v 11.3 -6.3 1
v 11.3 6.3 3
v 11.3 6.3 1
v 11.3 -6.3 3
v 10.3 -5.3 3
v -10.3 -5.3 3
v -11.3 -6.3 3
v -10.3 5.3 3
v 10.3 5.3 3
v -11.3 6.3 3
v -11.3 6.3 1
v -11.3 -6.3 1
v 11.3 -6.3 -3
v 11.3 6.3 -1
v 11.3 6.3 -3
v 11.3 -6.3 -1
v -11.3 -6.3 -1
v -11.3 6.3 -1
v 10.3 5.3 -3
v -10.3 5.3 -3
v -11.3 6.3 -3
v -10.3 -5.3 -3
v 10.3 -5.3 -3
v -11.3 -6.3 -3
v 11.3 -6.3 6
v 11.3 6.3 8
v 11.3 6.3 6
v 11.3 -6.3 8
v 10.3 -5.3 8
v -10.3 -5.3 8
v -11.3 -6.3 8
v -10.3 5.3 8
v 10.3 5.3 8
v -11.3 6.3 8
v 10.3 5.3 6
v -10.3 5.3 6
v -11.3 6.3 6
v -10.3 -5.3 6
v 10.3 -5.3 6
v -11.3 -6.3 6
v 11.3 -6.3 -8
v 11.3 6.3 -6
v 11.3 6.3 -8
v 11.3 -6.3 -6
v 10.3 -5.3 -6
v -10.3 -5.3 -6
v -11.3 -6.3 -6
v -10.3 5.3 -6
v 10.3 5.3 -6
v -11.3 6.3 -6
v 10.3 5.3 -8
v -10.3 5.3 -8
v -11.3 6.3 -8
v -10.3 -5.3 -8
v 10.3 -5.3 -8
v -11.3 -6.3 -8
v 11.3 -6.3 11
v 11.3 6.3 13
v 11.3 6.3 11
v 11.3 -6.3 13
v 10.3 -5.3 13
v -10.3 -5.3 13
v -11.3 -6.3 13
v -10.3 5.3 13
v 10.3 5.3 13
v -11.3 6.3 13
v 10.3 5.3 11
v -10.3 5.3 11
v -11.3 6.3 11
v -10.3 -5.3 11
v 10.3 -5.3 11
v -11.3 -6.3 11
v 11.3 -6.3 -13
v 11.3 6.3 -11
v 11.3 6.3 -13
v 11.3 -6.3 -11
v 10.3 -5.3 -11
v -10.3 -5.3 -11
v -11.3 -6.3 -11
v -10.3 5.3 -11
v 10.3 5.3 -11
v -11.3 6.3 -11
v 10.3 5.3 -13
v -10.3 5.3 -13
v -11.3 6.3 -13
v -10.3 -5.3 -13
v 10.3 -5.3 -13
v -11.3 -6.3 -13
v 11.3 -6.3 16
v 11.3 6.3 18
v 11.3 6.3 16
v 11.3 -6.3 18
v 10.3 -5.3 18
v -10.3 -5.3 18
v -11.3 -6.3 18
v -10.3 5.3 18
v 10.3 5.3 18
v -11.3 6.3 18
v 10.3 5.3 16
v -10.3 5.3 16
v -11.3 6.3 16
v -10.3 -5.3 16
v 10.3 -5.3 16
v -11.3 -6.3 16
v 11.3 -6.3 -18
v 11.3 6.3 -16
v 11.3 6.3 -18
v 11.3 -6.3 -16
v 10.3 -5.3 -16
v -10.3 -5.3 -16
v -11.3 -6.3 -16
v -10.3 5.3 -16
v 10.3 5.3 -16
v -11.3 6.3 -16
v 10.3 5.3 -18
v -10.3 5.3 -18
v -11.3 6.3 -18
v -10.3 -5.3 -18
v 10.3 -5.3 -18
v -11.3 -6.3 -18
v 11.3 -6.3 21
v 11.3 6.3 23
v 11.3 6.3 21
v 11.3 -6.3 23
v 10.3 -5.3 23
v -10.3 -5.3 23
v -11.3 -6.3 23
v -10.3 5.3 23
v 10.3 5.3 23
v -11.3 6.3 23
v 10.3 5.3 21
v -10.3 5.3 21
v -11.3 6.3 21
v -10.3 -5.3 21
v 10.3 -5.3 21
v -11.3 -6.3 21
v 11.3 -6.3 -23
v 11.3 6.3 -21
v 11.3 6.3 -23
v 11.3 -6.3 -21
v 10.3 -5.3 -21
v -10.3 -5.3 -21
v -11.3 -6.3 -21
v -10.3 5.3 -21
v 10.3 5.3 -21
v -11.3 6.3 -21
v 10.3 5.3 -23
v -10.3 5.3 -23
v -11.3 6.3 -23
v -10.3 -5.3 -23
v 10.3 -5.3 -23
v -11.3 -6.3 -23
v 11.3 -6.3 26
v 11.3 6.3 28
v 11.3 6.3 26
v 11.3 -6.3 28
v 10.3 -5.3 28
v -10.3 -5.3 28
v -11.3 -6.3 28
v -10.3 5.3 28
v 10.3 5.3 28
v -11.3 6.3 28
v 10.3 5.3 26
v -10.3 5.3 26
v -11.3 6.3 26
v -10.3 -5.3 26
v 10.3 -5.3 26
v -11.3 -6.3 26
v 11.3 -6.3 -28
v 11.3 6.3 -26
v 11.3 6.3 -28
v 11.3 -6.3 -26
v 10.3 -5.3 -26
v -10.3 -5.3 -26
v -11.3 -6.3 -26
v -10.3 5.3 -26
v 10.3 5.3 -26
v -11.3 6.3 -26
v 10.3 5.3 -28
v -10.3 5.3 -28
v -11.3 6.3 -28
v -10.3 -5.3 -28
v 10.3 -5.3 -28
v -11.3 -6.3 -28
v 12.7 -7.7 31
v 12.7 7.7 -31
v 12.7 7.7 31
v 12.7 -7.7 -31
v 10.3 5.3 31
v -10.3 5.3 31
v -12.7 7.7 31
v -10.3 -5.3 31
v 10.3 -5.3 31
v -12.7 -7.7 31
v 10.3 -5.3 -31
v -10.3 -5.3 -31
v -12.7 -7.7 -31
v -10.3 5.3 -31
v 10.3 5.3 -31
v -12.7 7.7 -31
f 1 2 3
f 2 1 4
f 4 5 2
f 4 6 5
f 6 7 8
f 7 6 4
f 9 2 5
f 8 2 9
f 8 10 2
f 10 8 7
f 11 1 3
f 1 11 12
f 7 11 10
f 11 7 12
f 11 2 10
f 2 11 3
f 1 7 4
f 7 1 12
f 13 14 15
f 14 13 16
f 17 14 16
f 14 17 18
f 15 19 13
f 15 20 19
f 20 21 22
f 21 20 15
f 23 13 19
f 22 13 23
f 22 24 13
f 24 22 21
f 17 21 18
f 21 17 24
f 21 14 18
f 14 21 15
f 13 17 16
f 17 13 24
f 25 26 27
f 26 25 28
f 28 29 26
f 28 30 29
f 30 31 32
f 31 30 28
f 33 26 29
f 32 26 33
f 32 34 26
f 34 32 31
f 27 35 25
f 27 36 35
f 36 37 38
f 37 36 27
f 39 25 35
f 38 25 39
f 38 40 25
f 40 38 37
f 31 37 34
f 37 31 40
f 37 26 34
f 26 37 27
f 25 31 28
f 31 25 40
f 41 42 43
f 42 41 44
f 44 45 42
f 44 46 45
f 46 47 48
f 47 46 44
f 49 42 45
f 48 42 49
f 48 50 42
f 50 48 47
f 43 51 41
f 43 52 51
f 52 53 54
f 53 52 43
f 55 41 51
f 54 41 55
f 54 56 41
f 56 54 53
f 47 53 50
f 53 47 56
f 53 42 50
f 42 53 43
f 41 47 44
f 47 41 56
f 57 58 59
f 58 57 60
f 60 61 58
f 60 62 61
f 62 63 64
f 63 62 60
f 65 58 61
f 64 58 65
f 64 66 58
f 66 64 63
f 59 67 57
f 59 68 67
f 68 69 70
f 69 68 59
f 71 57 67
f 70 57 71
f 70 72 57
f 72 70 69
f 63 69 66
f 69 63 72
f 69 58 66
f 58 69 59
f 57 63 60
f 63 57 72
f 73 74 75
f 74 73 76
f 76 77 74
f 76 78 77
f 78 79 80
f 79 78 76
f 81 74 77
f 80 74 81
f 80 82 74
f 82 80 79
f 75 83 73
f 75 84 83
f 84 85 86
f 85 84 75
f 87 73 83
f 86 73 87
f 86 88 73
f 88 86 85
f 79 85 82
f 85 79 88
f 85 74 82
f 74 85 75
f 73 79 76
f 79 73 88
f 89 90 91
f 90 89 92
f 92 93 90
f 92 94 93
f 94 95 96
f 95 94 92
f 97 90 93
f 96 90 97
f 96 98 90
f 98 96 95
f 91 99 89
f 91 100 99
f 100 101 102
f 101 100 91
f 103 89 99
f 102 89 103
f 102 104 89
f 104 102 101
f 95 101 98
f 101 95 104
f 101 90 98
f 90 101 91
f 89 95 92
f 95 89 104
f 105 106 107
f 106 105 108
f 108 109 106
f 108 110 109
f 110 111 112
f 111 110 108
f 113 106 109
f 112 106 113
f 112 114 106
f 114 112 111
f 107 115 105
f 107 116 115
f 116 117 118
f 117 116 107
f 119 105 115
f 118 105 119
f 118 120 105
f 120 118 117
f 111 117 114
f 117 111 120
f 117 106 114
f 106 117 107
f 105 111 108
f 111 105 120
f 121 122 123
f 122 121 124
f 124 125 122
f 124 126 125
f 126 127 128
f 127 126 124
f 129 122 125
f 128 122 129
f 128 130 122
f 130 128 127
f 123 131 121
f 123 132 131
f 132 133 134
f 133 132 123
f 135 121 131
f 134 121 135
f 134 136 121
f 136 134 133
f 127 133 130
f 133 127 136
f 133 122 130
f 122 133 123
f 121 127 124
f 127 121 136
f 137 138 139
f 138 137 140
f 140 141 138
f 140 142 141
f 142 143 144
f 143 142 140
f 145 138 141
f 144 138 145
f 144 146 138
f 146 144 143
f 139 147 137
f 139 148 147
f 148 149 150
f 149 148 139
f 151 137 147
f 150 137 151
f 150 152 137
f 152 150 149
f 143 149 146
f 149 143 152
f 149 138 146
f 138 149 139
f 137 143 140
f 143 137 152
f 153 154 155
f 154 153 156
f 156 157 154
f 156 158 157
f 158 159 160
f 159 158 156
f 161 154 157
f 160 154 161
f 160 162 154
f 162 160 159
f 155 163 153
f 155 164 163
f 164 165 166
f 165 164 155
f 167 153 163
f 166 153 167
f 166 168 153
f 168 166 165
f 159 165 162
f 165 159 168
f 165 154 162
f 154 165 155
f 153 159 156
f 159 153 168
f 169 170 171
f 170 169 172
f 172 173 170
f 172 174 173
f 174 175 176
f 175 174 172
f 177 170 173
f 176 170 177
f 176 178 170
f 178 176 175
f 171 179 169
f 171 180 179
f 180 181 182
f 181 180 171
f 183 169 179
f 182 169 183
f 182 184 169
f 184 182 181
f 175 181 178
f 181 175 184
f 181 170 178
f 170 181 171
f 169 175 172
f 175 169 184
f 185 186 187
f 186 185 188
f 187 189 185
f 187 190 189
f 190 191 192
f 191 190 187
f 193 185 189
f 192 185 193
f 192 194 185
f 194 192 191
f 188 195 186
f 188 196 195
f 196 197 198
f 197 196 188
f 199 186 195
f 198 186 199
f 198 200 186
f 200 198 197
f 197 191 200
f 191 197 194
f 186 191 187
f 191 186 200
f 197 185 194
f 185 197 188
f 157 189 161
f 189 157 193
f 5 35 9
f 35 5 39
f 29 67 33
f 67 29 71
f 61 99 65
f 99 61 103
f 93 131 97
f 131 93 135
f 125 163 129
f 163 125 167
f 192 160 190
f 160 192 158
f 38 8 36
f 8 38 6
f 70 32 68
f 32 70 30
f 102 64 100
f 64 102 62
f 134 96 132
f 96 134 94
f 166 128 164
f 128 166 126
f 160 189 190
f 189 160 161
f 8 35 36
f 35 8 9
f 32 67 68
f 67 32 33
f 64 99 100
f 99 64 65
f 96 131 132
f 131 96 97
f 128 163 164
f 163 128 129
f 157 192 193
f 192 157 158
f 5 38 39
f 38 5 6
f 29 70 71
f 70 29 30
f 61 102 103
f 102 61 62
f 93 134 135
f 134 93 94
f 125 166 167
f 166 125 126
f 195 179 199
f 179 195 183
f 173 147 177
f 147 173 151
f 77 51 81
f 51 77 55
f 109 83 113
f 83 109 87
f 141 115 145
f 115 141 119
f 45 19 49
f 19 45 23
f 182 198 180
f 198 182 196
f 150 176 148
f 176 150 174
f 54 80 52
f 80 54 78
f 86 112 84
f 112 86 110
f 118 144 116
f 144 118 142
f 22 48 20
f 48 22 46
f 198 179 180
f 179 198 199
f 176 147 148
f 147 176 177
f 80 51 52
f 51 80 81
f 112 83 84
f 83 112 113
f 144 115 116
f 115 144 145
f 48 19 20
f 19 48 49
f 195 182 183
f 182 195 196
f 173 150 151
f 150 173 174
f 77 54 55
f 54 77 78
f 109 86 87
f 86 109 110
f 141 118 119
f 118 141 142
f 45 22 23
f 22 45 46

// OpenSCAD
/* [Global] */

// - Define the wall thickness
Wall_Thickness=1.4; 

// - Define wall thickness in the center
Center_Wall_Thickness=2; 

// - Define the x dimension of the test member
Stock_X_Dimension=20; 

// - Define the y dimension of the test member
Stock_Y_Dimension=10; 

// - Define the depth of the glue joint
Hole_Length=30; 

// - Define the tolerance for the hole
Tolerance=0.3;

// - Define the depth of the texturing in the holes
Groove_Depth=1;

// - Define the width of the texturing in the holes
Groove_Width=2;

// - Define the distance between grooves
Groove_Spacing=3;

/* [Hidden] */
wall=Wall_Thickness+Groove_Depth;

length=2*Hole_Length+Center_Wall_Thickness; //Calculate max length
holeX=Stock_X_Dimension+(2*Tolerance); //Calculate hole dim. with tolerance.
holeY=Stock_Y_Dimension+(2*Tolerance);
X_dim=holeX+(2*wall); //Calculate external dimensions
Y_dim=holeY+(2*wall);
zTrans=Hole_Length/2+Center_Wall_Thickness/2+1; //Calculate translational value

grooveDist=Groove_Spacing+2;
grooveX=holeX+Groove_Depth*2;
grooveY=holeY+Groove_Depth*2;

difference()
    {
    cube(size = [X_dim,Y_dim,length], center=true);
    translate([0,0,zTrans]) cube(size=[holeX,holeY,Hole_Length+2], center=true);
    translate([0,0,-zTrans]) cube(size=[holeX,holeY,Hole_Length+2], center=true);
        for ( i = [(Center_Wall_Thickness+Groove_Width)/2 : grooveDist : Hole_Length] )
        {
            translate([0,0,i]) cube(size=[grooveX,grooveY,Groove_Width], center=true);
            translate([0,0,-i]) cube(size=[grooveX,grooveY,Groove_Width], center=true);
        }
    }
    
